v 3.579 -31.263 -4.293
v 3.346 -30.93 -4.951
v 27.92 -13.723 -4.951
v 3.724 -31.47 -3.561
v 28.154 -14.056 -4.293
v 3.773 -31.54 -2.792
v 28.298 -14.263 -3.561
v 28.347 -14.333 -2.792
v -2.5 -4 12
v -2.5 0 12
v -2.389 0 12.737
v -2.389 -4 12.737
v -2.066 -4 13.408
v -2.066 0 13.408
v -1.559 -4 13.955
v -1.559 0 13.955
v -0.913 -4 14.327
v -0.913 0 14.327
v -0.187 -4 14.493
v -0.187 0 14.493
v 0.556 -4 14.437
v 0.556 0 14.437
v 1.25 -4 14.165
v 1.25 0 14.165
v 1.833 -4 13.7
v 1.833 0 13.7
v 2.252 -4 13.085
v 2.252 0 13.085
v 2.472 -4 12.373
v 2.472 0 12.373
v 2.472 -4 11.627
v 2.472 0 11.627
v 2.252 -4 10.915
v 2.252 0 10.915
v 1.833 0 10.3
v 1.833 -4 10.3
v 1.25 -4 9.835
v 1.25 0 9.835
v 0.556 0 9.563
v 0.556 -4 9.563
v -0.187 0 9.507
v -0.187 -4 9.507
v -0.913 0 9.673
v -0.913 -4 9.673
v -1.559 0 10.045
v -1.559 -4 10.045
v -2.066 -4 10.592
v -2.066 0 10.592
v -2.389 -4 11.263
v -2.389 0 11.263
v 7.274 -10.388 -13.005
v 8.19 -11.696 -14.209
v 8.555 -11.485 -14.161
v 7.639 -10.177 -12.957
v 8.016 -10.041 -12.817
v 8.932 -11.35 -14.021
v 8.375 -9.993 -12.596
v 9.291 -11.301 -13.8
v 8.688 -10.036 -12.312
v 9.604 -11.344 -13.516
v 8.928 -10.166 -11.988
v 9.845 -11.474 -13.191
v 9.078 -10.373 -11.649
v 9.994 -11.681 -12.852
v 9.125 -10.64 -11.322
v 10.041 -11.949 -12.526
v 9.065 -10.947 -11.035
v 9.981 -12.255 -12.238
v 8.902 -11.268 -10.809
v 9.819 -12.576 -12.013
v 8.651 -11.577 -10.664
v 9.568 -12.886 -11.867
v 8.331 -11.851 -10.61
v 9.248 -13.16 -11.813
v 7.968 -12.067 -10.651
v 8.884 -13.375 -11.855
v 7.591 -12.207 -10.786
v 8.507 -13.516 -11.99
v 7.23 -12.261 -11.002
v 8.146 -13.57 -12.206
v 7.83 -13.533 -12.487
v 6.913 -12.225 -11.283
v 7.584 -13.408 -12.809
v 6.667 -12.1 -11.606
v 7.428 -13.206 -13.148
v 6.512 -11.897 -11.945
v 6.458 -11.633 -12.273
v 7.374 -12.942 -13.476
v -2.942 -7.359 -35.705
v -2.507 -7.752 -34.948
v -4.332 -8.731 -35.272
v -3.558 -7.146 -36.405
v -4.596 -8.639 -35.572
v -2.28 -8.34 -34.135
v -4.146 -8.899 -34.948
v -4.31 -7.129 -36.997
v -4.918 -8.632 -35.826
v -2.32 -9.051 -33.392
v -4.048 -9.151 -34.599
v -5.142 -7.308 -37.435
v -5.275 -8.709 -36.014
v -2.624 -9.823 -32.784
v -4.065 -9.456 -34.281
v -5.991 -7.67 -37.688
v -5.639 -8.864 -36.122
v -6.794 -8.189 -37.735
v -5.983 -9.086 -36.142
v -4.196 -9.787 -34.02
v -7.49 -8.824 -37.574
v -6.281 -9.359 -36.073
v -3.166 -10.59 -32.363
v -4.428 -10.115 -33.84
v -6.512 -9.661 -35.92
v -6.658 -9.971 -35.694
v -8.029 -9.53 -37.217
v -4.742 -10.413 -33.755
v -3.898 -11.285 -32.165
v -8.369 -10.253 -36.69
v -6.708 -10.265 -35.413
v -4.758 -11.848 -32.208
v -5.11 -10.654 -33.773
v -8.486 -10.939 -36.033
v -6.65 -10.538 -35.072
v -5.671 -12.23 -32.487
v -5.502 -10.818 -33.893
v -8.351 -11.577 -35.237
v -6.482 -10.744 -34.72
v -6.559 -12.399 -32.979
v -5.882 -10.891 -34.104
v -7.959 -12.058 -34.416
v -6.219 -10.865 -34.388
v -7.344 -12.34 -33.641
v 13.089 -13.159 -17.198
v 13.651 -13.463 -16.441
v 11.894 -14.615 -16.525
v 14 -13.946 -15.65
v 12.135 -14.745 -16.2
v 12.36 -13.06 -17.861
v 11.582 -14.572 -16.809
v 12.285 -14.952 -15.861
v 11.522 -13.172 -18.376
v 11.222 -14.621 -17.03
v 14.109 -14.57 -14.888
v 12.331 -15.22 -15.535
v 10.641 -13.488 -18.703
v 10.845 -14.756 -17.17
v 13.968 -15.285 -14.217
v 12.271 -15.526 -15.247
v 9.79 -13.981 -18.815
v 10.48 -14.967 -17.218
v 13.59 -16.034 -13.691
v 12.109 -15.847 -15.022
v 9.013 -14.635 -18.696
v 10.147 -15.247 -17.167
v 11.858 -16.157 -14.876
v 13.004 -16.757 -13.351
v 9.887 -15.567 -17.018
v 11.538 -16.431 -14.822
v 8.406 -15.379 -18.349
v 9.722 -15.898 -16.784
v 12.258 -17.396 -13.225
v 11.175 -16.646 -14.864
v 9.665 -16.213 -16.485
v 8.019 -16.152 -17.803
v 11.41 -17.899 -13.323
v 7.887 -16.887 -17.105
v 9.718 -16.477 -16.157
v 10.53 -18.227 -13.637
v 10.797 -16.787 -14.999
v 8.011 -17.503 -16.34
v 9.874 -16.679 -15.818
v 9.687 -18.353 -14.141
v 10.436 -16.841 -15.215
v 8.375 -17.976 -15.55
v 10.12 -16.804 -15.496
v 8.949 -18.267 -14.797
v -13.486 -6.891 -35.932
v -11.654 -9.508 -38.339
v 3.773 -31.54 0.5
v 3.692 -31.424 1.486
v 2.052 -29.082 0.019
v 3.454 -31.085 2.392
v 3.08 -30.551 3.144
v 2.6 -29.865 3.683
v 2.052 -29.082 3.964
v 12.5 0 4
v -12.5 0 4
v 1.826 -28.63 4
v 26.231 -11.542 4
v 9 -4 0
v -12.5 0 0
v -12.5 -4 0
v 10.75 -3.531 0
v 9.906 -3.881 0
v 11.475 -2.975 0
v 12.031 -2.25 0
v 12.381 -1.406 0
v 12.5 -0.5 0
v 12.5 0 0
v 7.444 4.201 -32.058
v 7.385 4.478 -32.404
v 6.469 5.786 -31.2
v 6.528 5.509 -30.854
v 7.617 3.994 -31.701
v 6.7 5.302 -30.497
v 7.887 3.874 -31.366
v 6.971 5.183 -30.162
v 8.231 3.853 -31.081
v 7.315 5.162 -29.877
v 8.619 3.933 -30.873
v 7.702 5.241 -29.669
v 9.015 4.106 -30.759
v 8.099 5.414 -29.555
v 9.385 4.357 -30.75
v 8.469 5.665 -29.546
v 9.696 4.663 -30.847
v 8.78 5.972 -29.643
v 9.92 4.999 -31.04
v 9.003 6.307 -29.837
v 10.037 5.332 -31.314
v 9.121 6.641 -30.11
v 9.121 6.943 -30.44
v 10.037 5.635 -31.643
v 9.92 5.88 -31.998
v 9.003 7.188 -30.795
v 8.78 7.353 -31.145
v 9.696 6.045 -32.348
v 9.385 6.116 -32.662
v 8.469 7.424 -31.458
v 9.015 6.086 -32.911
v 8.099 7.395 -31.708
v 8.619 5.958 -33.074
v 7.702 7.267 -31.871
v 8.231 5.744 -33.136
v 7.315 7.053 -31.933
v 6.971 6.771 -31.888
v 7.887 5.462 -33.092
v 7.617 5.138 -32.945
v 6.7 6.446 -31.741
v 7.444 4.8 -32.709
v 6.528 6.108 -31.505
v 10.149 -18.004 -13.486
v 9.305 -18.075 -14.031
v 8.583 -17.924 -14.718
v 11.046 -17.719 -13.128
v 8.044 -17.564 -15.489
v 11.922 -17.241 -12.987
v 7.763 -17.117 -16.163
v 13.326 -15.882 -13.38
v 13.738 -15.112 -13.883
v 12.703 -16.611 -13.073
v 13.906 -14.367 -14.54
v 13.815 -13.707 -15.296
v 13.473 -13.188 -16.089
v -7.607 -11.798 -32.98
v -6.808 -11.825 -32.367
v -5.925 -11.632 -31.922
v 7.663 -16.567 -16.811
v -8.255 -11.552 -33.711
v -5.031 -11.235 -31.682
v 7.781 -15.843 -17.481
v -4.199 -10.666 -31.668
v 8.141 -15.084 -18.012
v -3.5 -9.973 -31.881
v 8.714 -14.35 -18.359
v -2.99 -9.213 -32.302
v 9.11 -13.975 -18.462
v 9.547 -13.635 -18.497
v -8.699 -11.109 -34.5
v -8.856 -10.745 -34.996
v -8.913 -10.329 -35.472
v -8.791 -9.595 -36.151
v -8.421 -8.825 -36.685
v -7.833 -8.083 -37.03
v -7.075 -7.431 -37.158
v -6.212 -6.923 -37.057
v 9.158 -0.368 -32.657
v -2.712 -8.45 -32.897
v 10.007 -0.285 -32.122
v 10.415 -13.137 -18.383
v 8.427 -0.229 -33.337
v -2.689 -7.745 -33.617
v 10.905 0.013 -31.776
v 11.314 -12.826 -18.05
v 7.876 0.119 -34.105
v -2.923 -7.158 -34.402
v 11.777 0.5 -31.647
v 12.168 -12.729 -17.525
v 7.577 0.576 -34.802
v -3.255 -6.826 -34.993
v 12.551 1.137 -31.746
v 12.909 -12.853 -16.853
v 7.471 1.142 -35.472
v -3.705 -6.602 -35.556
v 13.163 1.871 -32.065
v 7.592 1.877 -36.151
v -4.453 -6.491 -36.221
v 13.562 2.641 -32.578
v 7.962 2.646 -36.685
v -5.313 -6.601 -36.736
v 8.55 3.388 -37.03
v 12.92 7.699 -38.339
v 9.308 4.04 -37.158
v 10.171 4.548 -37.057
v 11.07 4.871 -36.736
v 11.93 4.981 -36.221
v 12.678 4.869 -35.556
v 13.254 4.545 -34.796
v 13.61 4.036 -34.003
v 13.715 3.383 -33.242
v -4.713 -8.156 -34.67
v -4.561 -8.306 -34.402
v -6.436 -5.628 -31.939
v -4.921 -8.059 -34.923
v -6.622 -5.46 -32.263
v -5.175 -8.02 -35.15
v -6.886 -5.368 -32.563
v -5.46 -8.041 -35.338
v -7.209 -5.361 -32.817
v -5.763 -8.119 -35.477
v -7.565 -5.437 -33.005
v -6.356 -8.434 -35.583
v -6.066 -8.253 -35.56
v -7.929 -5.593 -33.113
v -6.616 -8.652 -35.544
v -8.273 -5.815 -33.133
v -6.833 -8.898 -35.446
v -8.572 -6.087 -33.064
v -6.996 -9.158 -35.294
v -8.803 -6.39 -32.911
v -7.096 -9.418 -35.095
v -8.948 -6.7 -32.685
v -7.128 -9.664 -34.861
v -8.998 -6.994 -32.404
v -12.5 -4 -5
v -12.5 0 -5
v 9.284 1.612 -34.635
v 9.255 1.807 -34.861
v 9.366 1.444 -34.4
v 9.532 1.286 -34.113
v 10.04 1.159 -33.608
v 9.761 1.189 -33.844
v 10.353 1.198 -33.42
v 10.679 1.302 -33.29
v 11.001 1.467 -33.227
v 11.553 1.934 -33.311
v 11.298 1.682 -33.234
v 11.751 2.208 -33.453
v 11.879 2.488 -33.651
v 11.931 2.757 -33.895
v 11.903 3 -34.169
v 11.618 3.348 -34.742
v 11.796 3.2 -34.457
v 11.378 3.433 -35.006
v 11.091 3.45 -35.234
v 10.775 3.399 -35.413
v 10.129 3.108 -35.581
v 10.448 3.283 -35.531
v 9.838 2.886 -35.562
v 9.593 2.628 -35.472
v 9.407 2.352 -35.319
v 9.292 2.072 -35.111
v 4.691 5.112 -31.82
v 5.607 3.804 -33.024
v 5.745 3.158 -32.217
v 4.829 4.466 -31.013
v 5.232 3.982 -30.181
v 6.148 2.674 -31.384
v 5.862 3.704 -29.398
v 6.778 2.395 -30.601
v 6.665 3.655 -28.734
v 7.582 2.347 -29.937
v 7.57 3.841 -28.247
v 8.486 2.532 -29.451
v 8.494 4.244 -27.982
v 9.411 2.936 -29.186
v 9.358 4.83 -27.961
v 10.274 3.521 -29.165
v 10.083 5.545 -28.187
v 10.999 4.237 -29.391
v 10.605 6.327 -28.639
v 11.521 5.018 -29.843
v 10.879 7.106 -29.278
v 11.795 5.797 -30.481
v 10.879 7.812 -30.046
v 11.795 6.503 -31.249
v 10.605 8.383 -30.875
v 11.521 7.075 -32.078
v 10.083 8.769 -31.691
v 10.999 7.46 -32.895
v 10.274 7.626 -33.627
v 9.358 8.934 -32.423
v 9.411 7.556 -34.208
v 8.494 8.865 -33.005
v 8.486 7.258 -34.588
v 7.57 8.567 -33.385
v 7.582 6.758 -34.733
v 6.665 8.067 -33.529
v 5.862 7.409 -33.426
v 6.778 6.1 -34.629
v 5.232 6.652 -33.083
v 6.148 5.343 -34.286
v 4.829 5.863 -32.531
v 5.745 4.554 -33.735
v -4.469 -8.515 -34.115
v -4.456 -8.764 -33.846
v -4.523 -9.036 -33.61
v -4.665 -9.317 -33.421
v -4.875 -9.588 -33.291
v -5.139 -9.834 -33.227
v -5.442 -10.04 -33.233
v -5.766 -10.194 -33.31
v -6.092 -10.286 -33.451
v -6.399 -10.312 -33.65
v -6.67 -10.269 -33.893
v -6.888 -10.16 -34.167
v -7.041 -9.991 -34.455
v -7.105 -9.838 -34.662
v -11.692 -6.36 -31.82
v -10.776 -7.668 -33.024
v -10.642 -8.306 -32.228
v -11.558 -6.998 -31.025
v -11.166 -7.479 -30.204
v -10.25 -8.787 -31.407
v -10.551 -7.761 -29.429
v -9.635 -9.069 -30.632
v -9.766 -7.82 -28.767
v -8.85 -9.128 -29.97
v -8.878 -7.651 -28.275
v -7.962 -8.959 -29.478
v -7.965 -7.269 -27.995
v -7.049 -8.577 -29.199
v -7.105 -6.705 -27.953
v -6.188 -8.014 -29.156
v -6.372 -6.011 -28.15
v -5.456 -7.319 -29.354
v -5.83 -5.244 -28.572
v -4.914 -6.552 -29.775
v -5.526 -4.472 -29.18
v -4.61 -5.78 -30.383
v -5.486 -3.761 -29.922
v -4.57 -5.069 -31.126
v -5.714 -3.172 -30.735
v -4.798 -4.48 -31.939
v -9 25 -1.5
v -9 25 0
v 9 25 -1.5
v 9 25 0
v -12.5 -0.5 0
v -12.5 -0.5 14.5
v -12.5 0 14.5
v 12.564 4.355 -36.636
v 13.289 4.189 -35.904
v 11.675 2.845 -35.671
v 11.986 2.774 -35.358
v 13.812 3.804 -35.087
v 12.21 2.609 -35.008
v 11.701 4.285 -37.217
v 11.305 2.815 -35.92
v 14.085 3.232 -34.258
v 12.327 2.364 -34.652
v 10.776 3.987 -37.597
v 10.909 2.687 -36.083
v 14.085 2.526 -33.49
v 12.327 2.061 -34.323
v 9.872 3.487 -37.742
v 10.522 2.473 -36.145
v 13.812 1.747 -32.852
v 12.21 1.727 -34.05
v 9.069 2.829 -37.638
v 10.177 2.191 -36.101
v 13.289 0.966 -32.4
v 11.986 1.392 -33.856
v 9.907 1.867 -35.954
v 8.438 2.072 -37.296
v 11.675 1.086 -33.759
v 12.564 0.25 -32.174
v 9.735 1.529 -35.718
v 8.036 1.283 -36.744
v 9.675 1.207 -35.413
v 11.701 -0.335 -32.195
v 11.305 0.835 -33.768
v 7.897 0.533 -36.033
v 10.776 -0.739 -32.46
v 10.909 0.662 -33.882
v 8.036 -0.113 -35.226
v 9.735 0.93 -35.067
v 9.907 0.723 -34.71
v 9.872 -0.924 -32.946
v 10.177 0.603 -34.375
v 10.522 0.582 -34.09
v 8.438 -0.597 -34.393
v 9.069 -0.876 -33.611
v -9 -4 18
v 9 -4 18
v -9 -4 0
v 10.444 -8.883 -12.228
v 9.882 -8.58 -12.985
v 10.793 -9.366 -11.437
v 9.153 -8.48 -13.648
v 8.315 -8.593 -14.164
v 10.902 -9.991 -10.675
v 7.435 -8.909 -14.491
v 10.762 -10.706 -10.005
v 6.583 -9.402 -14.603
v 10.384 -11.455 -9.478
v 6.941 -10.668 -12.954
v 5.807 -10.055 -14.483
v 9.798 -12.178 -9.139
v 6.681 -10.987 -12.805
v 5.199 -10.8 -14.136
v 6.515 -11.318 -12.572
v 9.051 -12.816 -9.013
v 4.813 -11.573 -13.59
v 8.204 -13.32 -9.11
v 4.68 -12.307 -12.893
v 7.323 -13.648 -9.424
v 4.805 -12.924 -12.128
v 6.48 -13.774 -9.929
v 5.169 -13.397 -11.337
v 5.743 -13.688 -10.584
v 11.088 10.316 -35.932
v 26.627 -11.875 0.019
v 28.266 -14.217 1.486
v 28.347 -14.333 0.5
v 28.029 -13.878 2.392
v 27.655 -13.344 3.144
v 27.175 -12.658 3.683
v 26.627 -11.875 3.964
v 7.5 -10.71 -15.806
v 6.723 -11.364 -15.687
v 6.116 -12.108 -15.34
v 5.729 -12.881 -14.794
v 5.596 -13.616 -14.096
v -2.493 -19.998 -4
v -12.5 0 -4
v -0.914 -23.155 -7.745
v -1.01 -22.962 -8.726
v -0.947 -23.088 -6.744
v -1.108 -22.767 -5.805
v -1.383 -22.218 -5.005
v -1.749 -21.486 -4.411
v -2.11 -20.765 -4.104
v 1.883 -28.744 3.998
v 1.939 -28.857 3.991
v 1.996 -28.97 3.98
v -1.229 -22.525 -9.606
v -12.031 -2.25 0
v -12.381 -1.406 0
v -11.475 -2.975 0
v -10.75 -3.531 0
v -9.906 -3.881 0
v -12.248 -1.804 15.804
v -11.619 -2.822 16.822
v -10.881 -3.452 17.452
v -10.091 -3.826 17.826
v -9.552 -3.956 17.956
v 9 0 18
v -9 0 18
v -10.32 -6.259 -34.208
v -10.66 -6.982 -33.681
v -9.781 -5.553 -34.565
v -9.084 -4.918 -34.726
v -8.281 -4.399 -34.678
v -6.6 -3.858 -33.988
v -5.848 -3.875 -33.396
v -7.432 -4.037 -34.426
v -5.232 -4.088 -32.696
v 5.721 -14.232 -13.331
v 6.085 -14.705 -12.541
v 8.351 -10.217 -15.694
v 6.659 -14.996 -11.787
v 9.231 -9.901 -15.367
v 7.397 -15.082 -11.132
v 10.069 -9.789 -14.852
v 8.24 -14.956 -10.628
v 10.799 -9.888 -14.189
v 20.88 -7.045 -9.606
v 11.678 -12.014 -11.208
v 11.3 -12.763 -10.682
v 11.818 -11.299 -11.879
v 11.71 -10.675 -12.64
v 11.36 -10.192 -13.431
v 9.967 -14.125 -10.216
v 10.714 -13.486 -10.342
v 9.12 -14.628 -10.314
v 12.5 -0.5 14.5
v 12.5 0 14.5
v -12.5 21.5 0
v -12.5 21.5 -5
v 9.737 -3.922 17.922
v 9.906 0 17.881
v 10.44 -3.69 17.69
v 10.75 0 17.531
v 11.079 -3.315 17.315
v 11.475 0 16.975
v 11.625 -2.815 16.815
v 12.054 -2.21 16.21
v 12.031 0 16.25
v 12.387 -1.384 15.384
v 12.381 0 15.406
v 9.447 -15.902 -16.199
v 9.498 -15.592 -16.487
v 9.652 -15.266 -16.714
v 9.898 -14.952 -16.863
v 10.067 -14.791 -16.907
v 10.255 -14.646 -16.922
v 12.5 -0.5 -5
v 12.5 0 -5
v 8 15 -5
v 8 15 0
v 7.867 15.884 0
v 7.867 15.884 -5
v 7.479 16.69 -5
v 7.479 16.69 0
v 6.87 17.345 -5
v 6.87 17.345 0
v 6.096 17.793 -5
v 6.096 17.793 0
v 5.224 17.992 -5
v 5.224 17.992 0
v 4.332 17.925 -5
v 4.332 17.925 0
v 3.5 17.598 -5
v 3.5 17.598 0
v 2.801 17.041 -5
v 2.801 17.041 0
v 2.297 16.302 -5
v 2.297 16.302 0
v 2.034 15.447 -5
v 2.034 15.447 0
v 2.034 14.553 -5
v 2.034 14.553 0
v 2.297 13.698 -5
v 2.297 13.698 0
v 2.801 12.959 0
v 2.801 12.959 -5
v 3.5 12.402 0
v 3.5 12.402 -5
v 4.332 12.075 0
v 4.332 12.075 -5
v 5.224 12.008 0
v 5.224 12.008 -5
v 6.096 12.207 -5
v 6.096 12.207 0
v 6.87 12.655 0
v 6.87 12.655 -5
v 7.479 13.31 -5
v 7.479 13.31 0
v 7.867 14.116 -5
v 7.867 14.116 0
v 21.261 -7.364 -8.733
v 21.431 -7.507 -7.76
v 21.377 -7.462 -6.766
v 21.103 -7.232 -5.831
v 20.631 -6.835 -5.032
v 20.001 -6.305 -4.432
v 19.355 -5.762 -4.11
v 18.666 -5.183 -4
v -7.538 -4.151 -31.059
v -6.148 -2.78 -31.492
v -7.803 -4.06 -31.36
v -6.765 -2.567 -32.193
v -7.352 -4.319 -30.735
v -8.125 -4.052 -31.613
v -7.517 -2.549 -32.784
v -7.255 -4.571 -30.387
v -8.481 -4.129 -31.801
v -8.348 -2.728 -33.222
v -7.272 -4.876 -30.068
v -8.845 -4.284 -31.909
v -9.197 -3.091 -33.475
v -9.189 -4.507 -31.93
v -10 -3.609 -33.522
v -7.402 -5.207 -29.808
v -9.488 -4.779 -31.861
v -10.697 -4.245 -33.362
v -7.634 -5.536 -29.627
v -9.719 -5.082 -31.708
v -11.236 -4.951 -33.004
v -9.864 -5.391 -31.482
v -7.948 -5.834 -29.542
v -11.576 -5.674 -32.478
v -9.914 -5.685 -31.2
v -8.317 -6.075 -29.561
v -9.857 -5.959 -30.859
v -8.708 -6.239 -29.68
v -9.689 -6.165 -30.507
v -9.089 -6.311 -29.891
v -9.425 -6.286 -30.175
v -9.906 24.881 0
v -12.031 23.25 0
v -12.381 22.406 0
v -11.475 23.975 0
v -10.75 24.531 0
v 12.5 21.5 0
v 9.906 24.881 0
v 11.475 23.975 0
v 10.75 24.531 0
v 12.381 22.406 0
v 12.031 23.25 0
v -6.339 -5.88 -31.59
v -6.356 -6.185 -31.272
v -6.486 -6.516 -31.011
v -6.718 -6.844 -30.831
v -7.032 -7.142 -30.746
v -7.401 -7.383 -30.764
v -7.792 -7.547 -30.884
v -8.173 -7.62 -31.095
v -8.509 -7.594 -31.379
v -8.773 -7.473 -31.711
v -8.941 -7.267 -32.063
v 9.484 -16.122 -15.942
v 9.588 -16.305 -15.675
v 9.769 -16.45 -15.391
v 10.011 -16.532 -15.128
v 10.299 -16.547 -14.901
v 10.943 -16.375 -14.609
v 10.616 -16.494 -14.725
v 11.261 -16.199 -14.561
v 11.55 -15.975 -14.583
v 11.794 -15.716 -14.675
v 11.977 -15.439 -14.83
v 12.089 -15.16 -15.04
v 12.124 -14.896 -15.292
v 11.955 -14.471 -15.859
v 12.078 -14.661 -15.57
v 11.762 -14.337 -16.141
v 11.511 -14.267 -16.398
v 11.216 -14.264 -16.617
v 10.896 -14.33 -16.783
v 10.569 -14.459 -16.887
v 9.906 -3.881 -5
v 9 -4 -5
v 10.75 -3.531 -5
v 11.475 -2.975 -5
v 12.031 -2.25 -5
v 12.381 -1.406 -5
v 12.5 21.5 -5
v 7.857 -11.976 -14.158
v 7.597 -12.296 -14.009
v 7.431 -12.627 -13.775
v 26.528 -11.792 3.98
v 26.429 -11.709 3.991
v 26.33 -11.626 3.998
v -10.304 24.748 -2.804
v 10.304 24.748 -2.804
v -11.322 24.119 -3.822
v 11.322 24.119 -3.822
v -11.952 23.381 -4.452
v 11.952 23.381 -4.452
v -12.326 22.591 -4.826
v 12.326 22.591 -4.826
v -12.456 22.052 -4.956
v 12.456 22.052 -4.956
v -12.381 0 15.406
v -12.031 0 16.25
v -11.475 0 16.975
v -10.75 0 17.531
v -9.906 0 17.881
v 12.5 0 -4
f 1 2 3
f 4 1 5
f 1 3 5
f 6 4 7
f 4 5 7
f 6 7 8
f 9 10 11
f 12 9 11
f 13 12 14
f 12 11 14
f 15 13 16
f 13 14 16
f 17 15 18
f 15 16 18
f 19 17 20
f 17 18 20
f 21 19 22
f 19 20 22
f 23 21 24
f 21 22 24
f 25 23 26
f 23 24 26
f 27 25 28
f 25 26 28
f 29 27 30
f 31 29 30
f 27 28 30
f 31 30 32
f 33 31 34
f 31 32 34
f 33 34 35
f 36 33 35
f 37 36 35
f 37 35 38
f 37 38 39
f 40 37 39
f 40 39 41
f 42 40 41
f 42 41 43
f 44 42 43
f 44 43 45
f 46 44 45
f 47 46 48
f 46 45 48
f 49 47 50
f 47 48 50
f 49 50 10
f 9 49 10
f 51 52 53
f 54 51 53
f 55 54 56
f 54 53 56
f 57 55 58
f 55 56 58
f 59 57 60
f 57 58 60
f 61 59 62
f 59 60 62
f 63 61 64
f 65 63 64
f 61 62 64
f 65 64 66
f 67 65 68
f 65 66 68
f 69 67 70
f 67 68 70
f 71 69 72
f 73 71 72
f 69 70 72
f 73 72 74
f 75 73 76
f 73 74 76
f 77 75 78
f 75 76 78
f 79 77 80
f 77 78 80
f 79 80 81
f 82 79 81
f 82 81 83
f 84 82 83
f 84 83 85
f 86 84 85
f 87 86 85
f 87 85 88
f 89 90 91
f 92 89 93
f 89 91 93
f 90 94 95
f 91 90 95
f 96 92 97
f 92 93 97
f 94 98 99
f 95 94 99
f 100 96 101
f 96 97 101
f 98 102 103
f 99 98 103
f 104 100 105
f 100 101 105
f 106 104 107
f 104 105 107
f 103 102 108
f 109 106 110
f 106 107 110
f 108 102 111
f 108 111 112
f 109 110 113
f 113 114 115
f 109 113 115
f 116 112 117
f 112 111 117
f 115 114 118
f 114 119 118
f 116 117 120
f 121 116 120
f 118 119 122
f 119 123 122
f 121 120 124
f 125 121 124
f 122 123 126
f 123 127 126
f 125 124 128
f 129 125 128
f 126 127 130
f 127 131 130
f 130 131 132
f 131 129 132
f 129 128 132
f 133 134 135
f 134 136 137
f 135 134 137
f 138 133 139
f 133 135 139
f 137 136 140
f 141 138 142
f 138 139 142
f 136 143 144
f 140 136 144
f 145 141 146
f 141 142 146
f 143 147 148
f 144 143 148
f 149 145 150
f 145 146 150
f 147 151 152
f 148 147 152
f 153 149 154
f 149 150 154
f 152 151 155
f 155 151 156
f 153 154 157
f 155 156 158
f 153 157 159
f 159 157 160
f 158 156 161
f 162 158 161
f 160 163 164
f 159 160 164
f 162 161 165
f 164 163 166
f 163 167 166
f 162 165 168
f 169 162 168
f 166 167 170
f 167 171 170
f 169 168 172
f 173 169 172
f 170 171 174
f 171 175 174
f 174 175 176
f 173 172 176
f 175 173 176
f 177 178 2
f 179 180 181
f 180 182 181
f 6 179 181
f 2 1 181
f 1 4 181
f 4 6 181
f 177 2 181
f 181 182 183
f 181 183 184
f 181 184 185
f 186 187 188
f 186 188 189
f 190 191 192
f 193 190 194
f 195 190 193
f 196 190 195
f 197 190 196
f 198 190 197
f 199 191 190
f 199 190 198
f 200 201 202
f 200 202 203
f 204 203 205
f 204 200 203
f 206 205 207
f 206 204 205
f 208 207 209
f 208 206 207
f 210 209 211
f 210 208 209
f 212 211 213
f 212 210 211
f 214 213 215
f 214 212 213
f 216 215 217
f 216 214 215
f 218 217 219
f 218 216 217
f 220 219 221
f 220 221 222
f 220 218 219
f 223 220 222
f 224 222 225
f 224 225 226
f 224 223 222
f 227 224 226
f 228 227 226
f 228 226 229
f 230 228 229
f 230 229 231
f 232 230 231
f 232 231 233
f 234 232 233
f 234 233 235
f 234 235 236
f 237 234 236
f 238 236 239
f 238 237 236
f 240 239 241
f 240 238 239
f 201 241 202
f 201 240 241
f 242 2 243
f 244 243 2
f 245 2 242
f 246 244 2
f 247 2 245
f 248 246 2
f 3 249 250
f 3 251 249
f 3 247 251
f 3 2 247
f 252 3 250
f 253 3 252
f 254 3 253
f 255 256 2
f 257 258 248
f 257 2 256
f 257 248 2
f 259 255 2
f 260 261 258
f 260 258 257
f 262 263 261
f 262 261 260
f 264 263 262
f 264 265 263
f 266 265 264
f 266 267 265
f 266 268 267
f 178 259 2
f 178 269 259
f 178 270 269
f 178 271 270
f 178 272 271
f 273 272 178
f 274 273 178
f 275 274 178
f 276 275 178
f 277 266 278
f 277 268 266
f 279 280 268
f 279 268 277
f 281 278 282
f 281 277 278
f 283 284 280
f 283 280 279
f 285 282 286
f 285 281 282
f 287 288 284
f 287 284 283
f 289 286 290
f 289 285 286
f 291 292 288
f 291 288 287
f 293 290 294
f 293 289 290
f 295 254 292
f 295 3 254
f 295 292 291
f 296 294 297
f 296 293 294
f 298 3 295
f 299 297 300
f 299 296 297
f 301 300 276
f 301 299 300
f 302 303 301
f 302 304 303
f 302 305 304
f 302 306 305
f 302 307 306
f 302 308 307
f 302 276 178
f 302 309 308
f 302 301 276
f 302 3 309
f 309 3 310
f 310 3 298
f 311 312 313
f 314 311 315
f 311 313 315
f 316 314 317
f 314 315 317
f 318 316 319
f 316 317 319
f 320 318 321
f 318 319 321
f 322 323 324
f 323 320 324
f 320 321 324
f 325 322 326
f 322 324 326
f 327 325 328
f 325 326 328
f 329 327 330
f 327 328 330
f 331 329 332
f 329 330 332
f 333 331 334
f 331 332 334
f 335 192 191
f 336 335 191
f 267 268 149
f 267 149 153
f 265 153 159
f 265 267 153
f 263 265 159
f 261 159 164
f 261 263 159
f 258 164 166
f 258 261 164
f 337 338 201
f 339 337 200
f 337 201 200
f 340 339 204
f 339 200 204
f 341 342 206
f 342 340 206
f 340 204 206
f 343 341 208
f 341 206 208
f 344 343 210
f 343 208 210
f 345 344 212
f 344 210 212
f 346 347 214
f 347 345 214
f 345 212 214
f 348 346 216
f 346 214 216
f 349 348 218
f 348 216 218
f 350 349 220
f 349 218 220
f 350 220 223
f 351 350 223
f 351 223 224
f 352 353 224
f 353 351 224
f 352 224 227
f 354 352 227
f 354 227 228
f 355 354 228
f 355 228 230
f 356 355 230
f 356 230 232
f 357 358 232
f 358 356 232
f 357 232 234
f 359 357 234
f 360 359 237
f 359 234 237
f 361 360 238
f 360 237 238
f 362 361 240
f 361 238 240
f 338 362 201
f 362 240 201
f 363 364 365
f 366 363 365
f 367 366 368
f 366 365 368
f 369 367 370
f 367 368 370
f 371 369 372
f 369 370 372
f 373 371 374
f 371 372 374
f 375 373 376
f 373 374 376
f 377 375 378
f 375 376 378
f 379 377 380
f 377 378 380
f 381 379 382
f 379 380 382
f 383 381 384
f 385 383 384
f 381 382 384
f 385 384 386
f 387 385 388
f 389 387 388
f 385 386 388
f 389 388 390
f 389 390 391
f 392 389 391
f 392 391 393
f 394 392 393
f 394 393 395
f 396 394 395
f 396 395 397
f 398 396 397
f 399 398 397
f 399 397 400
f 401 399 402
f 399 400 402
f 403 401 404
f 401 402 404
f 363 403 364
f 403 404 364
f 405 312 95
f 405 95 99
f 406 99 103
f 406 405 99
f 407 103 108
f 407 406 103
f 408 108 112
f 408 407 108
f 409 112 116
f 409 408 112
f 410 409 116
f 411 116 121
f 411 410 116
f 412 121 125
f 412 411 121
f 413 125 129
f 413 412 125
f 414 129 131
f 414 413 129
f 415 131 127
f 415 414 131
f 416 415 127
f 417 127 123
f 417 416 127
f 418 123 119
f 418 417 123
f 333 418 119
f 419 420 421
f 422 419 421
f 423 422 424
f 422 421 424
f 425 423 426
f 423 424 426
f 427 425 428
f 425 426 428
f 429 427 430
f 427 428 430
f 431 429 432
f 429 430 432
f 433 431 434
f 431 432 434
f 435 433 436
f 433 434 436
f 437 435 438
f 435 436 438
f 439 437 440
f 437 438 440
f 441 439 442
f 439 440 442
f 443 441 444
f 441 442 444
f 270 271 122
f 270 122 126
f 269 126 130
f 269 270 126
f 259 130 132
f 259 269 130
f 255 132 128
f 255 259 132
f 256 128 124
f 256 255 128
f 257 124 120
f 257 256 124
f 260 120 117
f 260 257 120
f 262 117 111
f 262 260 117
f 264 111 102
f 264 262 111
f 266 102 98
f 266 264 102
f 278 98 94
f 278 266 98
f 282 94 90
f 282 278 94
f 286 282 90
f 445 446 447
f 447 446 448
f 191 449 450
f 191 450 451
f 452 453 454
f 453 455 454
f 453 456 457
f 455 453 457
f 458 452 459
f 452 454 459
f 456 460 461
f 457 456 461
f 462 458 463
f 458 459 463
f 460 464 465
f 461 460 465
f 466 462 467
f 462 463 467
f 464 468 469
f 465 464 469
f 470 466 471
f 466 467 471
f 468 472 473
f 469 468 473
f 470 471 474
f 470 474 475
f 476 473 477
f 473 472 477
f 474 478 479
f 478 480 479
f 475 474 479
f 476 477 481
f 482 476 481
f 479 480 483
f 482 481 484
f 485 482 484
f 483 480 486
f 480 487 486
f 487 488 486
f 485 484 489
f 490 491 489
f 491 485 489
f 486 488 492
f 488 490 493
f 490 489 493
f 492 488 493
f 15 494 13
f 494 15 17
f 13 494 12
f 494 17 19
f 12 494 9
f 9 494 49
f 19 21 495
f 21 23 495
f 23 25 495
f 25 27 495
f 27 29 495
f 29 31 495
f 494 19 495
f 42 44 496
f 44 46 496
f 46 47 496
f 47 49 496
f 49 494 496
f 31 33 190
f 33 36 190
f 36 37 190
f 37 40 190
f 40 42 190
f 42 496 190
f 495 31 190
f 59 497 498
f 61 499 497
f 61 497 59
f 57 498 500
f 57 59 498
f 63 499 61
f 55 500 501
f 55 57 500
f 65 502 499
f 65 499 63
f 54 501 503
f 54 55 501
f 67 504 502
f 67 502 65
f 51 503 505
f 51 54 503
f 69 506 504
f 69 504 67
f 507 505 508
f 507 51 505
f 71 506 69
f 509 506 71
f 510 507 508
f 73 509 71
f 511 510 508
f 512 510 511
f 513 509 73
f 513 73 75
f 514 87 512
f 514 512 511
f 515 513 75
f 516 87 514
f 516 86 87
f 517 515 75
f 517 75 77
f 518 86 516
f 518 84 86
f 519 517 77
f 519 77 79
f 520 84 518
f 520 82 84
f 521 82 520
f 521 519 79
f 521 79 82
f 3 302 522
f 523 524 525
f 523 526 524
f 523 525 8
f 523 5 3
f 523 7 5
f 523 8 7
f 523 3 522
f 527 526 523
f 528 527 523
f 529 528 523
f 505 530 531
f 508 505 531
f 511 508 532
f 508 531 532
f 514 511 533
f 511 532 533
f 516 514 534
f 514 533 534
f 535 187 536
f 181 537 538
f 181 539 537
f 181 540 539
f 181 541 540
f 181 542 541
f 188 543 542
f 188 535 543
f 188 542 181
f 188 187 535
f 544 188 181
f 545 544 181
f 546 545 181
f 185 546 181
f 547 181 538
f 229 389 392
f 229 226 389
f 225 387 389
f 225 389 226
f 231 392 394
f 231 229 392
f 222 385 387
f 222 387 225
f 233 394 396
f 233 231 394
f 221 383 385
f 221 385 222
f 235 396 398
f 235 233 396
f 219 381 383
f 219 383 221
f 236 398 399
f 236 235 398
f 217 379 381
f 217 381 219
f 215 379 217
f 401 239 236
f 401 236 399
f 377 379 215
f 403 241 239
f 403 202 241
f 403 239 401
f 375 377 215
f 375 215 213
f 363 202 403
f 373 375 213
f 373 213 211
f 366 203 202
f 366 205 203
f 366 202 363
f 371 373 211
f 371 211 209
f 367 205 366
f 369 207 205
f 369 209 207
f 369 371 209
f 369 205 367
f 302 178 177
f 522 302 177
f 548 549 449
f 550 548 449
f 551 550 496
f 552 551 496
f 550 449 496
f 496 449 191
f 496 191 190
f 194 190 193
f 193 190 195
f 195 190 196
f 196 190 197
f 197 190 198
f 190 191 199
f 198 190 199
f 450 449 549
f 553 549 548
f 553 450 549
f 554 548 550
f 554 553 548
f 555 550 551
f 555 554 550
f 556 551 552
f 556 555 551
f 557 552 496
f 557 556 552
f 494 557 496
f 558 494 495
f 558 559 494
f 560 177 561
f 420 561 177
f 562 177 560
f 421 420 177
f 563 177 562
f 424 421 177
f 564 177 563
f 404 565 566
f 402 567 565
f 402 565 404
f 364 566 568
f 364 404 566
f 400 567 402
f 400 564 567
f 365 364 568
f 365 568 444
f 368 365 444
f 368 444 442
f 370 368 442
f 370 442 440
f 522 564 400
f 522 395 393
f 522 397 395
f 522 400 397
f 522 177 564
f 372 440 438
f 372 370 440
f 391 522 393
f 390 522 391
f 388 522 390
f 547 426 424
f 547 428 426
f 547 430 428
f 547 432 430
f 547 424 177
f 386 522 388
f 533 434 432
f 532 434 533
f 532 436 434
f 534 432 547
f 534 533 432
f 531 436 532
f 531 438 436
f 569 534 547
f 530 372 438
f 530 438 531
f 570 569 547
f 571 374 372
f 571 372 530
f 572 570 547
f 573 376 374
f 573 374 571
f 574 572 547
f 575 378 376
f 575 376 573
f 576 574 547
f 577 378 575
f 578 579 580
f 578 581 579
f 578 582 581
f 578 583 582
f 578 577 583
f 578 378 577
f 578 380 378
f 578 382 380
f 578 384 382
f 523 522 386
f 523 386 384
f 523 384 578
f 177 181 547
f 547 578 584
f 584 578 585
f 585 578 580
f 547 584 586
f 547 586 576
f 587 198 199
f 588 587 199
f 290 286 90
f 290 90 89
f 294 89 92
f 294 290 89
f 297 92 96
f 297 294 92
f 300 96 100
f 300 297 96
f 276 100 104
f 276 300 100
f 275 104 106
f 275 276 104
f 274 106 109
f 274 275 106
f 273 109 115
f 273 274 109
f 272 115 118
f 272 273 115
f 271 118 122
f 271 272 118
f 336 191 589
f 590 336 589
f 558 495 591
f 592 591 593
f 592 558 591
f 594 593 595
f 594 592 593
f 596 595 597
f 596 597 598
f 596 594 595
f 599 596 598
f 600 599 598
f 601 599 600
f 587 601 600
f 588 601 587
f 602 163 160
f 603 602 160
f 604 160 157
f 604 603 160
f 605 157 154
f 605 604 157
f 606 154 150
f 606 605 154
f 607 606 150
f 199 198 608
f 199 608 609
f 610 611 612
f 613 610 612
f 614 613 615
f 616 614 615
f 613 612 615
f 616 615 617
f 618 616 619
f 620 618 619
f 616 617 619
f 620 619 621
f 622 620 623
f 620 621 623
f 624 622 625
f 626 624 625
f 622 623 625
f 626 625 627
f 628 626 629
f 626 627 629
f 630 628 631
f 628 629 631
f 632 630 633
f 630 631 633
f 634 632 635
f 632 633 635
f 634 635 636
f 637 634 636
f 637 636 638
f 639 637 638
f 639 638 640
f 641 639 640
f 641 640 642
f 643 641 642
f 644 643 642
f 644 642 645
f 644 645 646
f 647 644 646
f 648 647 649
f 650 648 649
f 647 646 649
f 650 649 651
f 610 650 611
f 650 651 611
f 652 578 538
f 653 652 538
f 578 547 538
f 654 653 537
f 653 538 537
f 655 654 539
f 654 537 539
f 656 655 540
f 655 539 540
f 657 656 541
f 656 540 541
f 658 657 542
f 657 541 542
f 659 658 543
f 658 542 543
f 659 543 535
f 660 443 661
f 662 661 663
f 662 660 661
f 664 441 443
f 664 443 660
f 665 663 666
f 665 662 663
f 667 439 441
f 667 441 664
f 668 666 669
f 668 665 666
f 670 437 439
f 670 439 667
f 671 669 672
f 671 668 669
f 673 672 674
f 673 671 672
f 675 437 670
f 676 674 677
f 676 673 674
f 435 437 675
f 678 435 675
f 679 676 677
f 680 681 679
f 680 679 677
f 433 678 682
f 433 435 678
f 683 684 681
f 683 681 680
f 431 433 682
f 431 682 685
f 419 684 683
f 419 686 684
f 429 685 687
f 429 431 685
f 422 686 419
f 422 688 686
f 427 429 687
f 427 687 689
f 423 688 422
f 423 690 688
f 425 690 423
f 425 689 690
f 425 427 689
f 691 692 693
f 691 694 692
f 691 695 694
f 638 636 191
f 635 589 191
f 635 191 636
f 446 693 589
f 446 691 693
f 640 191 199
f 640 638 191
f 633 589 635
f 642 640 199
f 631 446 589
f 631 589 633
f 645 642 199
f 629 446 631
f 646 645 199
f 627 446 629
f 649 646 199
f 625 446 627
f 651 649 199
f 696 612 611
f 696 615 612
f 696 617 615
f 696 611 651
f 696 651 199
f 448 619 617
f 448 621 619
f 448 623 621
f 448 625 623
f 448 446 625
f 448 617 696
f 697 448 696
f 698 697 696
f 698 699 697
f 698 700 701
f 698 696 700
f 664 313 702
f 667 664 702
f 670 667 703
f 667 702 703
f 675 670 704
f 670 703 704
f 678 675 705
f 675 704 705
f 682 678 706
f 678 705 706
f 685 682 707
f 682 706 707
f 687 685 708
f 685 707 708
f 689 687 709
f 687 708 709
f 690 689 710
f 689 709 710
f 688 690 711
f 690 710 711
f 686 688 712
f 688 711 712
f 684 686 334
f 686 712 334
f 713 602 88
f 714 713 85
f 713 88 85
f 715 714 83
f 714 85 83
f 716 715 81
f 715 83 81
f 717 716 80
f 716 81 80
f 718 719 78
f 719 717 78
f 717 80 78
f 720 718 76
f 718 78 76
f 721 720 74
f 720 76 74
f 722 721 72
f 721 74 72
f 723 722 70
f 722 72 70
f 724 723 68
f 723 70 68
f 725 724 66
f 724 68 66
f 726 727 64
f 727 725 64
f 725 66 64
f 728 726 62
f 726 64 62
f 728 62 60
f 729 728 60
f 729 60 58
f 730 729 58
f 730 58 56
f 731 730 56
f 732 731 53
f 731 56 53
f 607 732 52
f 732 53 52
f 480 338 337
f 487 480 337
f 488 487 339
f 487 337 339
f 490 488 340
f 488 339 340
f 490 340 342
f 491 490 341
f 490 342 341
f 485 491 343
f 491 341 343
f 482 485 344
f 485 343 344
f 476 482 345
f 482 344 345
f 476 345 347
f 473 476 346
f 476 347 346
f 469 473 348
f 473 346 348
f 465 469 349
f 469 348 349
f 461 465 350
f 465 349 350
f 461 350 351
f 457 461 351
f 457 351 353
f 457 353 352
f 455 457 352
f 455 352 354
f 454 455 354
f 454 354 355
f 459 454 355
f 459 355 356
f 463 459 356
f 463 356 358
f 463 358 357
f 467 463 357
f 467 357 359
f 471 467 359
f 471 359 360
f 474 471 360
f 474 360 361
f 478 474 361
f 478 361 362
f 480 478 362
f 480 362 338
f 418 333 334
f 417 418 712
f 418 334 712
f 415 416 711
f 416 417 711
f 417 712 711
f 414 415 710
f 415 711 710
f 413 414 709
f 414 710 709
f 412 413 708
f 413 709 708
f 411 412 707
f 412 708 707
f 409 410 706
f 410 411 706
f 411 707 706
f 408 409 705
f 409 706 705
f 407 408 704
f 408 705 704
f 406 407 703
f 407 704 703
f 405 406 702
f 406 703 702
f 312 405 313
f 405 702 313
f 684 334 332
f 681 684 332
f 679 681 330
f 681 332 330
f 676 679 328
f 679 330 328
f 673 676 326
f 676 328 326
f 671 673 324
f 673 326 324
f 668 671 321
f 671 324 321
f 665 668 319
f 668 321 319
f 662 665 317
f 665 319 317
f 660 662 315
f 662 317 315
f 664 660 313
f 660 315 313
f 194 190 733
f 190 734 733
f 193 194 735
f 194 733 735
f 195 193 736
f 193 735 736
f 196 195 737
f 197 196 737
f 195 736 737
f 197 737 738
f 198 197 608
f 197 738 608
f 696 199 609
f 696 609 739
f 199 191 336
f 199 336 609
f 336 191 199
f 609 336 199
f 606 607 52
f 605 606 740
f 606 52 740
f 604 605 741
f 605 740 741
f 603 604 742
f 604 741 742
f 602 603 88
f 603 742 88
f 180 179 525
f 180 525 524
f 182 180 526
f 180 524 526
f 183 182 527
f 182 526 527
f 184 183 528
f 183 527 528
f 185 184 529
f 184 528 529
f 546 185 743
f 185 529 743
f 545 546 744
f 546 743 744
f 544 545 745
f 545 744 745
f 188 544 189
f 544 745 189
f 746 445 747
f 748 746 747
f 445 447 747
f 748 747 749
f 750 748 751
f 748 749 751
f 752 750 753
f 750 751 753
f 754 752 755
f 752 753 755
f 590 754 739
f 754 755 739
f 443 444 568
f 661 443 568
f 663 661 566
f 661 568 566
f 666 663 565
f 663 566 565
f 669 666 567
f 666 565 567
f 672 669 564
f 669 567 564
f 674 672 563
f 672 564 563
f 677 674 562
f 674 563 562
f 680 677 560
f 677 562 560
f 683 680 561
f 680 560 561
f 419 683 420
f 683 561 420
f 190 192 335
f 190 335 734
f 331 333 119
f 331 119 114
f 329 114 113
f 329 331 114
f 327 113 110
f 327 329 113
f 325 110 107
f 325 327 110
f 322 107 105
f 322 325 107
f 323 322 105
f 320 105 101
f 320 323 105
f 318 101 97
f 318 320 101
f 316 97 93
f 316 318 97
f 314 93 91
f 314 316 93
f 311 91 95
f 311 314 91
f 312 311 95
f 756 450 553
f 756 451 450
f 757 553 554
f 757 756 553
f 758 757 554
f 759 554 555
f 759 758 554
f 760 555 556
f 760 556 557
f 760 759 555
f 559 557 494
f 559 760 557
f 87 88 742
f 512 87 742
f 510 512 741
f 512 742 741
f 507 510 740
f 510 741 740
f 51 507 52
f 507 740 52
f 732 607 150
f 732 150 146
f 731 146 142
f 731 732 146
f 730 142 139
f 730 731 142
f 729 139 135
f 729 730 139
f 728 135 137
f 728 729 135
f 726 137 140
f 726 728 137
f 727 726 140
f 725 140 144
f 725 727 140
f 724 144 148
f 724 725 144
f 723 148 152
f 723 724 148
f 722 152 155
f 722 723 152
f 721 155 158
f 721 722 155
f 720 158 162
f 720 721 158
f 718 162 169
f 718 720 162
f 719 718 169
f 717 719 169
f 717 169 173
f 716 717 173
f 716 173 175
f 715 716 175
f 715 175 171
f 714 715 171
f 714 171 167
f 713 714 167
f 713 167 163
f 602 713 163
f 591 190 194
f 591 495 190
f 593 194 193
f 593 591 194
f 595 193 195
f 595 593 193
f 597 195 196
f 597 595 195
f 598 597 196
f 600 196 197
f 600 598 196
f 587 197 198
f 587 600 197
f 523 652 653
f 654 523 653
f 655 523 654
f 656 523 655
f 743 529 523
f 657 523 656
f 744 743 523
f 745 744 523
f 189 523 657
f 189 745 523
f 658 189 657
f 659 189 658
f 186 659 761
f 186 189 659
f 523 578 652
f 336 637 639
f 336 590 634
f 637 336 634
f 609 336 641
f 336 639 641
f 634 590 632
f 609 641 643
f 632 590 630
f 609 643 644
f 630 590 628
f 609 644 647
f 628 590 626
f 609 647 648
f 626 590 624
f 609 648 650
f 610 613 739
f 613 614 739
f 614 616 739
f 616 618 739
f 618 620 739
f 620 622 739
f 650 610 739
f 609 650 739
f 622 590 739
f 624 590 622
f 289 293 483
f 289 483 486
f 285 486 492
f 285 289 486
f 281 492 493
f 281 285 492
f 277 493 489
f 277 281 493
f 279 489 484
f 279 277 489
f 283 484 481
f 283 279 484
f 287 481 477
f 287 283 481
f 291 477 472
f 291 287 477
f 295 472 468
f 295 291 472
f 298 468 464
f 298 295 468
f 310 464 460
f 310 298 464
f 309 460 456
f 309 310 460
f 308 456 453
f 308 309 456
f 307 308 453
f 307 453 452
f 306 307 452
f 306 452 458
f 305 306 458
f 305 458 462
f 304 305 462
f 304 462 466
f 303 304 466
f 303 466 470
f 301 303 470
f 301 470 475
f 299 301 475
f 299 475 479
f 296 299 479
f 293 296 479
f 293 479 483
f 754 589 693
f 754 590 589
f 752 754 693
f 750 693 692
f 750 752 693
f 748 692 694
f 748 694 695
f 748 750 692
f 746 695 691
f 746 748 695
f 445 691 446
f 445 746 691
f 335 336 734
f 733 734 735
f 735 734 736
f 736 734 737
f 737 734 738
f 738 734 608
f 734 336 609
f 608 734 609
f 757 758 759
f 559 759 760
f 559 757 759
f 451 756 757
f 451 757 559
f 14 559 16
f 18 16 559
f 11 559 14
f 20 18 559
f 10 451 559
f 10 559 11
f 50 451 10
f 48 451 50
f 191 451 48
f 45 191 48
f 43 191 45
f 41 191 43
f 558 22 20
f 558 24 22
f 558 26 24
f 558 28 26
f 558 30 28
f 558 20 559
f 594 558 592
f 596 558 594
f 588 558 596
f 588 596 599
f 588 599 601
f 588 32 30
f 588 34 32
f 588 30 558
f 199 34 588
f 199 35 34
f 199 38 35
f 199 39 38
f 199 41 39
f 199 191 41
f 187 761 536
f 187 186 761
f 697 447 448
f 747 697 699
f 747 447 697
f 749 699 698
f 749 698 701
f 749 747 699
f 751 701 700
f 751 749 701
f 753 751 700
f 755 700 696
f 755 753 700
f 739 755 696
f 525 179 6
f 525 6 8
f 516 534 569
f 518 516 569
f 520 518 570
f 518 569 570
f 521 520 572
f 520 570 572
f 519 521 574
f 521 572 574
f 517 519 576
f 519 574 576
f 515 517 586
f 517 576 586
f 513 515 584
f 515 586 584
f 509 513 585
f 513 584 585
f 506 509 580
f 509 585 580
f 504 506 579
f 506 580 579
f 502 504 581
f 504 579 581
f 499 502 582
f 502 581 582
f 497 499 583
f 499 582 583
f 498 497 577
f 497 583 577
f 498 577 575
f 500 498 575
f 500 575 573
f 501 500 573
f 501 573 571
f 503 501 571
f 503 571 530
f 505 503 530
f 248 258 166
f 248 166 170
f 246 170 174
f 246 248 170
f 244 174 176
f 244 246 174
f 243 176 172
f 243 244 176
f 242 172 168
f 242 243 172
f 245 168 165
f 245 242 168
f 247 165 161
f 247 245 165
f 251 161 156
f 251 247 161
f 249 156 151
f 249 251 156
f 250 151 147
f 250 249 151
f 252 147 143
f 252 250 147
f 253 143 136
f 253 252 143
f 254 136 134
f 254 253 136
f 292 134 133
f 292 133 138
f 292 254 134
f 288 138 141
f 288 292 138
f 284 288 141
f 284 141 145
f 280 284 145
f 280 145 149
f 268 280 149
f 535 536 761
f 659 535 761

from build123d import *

# Parameters (mm, degrees)
F0_W      = 25
F0_H      = 25
F0_R      = 3
F1_DEPTH  = 5
F0_H_2    = 4
F2_DEPTH  = 18
F3_DEPTH  = 5
F4_R      = 2.5
F5_DEPTH  = 4
F7_DEPTH  = 4
F8_W      = 30
F8_H      = 8
F9_DEPTH  = 3
F11_DEPTH = 30
F12_R     = 3.5
F12_2_R   = 3.5
F12_3_R   = 3.5
F12_4_R   = 3.5
F13_R     = 3.5
F13_R_2   = 1.5
F14_DEPTH = 2
F15_DEPTH = 10
F16_DEPTH = 7


with BuildPart() as f1:
    # F0 (on Top) → F1 (new body)
    with BuildSketch(Plane.XY):
        with Locations((0, 12.5)):
            Rectangle(F0_W, F0_H)
        with Locations((5, 15)):
            Circle(F0_R, mode=Mode.SUBTRACT)
    extrude(amount=-F1_DEPTH)

    # F12
    f12_edges = [f1.edges().sort_by_distance(p)[0] for p in [
        (0, 25, -5),
        (12.5, 25, -2.5),
        (-12.5, 25, -2.5),
    ]]
    fillet(f12_edges, radius=F12_R)


with BuildPart() as f2:
    # F0 (on Top) → F2 (new body)
    with BuildSketch(Plane.XY):
        with Locations((0, -2)):
            Rectangle(F0_W, F0_H_2)
    extrude(amount=F2_DEPTH)


with BuildPart() as f3:
    # F3 (new): a face of the model
    f3_faces = [f2.part.faces().sort_by_distance(p)[0] for p in [
        (0, -2, 0),
    ]]
    extrude(f3_faces, amount=F3_DEPTH)

    # F12#3
    f12_3_edges = [f3.edges().sort_by_distance(p)[0] for p in [
        (12.5, -4, -2.5),
    ]]
    fillet(f12_3_edges, radius=F12_3_R)


with BuildPart() as f2_1:
    add(f2.part)

    # F4 (on face) → F5 (cut)
    with BuildSketch(Plane(origin=(0, 0, 0), x_dir=(-1, 0, 0), z_dir=(0, 1, 0))):
        with Locations((0, 12)):
            Circle(F4_R)
    extrude(amount=-F5_DEPTH, mode=Mode.SUBTRACT)

    # F12#2
    f12_2_edges = [f2_1.edges().sort_by_distance(p)[0] for p in [
        (12.5, -4, 9),
        (-12.5, -2, 18),
        (12.5, -2, 18),
        (-12.5, -4, 9),
    ]]
    fillet(f12_2_edges, radius=F12_2_R)


with BuildPart() as f7:
    # F6 (on Top) → F7 (new body, symmetric)
    with BuildSketch(Plane.XY):
        Polygon((14.3394109088, -20.4788011072), (0, 0), (-12.5, 0), (2.0521302444, -29.0824476525), align=None)
        Polygon((12.5, 0), (0, 0), (14.3394109088, -20.4788011072), (26.6266915731, -11.875154562), align=None)
    extrude(amount=F7_DEPTH, both=True)

    # F8 (on face) → F9 (join)
    with BuildSketch(Plane(origin=(14.3394109088, -20.4788011072, 0), x_dir=(0.8191520443, 0.5735764364, 0), z_dir=(0.5735764364, -0.8191520443, 0))):
        Rectangle(F8_W, F8_H)
    extrude(amount=F9_DEPTH)

    # F10 (on face) → F11 (join, through all)
    with BuildSketch(Plane(origin=(12.2872806643, 8.6036465453, 0), x_dir=(-0.5735764364, 0.8191520443, 0), z_dir=(0.8191520443, 0.5735764364, 0))):
        Polygon((-1.1037908826, -38.339035595), (2.0907511576, -35.9317755024), (-25, 0.0188655351), (-25, -4), (-28, -4), align=None)
        Polygon((-25, -4), (-25, 0.0188655351), (-28, 4), (-28, -4), align=None)
    extrude(amount=-F11_DEPTH)

    # F12#4
    f12_4_edges = [f7.edges().sort_by_distance(p)[0] for p in [
        (16.06014, -22.936257, 4),
        (16.06014, -22.936257, -4),
        (12.454755, -18.101418, -4),
    ]]
    fillet(f12_4_edges, radius=F12_4_R)

    # F13 (on face) → F15 (cut, symmetric)
    with BuildSketch(Plane(origin=(9.1407432849, -13.0543343024, -12.0089384548), x_dir=(-0.8889117385, -0.3371276804, -0.3101303729), z_dir=(-0.4580785098, 0.6542039107, 0.6018150232))):
        with Locations((0.4752934415, -26.8795094532)):
            Circle(F13_R_2)
        with BuildLine():
            ThreePointArc((1.9872074921, -1.1561765378), (-0.7625388666, -0.3266380884), (1.06969544, -2.5384600798))
            ThreePointArc((1.06969544, -2.5384600798), (1.7369538507, -1.9857149872), (1.9872074921, -1.1561765378))
        make_face()
        with BuildLine():
            ThreePointArc((20.4057406689, -19.1130034801), (18.6086088067, -17.6427270923), (17.5234571269, -19.695491428))
            ThreePointArc((17.5234571269, -19.695491428), (19.202872531, -20.5832798679), (20.4057406689, -19.1130034801))
        make_face()
    extrude(amount=F15_DEPTH, both=True, mode=Mode.SUBTRACT)



with BuildPart() as f14:
    # F13 (on face) → F14 (new body)
    with BuildSketch(Plane(origin=(9.1407432849, -13.0543343024, -12.0089384548), x_dir=(-0.8889117385, -0.3371276804, -0.3101303729), z_dir=(-0.4580785098, 0.6542039107, 0.6018150232))):
        with BuildLine():
            ThreePointArc((3.9872074921, -1.1561765378), (-2.4288673448, 0.7794131775), (1.8463460373, -4.3815048024))
            ThreePointArc((1.8463460373, -4.3815048024), (3.4032823289, -3.091766253), (3.9872074921, -1.1561765378))
        make_face()
        with BuildLine():
            ThreePointArc((1.9872074921, -1.1561765378), (1.7369538507, -1.9857149872), (1.06969544, -2.5384600798))
            ThreePointArc((1.06969544, -2.5384600798), (-0.7625388666, -0.3266380884), (1.9872074921, -1.1561765378))
        make_face(mode=Mode.SUBTRACT)
        with Locations((0.4752934415, -26.8795094532)):
            Circle(F13_R)
        with Locations((0.4752934415, -26.8795094532)):
            Circle(F13_R_2, mode=Mode.SUBTRACT)
        with BuildLine():
            ThreePointArc((22.4057406689, -19.1130034801), (18.2124329906, -15.6823585752), (15.6804124042, -20.4721420253))
            ThreePointArc((15.6804124042, -20.4721420253), (19.5990483472, -22.5436483849), (22.4057406689, -19.1130034801))
        make_face()
        with BuildLine():
            ThreePointArc((20.4057406689, -19.1130034801), (19.202872531, -20.5832798679), (17.5234571269, -19.695491428))
            ThreePointArc((17.5234571269, -19.695491428), (18.6086088067, -17.6427270923), (20.4057406689, -19.1130034801))
        make_face(mode=Mode.SUBTRACT)
    extrude(amount=F14_DEPTH)


with BuildPart() as f7_1:
    add(f7.part)
    # F16 (add): faces of the model
    f16_faces = [f14.part.faces().sort_by_distance(p)[0] for p in [
        (8.9654842523, -12.8040384631, -9.0911430873),
        (10.8252856581, 7.4384982699, -29.6802130839),
        (-11.3668887804, -7.1303397584, -30.7349680486),
    ]]

    add(f14.part)  # F16 merges F14
    extrude(f16_faces, amount=-F16_DEPTH)


solid = Compound([f1.part, f3.part, f2_1.part, f7_1.part])
